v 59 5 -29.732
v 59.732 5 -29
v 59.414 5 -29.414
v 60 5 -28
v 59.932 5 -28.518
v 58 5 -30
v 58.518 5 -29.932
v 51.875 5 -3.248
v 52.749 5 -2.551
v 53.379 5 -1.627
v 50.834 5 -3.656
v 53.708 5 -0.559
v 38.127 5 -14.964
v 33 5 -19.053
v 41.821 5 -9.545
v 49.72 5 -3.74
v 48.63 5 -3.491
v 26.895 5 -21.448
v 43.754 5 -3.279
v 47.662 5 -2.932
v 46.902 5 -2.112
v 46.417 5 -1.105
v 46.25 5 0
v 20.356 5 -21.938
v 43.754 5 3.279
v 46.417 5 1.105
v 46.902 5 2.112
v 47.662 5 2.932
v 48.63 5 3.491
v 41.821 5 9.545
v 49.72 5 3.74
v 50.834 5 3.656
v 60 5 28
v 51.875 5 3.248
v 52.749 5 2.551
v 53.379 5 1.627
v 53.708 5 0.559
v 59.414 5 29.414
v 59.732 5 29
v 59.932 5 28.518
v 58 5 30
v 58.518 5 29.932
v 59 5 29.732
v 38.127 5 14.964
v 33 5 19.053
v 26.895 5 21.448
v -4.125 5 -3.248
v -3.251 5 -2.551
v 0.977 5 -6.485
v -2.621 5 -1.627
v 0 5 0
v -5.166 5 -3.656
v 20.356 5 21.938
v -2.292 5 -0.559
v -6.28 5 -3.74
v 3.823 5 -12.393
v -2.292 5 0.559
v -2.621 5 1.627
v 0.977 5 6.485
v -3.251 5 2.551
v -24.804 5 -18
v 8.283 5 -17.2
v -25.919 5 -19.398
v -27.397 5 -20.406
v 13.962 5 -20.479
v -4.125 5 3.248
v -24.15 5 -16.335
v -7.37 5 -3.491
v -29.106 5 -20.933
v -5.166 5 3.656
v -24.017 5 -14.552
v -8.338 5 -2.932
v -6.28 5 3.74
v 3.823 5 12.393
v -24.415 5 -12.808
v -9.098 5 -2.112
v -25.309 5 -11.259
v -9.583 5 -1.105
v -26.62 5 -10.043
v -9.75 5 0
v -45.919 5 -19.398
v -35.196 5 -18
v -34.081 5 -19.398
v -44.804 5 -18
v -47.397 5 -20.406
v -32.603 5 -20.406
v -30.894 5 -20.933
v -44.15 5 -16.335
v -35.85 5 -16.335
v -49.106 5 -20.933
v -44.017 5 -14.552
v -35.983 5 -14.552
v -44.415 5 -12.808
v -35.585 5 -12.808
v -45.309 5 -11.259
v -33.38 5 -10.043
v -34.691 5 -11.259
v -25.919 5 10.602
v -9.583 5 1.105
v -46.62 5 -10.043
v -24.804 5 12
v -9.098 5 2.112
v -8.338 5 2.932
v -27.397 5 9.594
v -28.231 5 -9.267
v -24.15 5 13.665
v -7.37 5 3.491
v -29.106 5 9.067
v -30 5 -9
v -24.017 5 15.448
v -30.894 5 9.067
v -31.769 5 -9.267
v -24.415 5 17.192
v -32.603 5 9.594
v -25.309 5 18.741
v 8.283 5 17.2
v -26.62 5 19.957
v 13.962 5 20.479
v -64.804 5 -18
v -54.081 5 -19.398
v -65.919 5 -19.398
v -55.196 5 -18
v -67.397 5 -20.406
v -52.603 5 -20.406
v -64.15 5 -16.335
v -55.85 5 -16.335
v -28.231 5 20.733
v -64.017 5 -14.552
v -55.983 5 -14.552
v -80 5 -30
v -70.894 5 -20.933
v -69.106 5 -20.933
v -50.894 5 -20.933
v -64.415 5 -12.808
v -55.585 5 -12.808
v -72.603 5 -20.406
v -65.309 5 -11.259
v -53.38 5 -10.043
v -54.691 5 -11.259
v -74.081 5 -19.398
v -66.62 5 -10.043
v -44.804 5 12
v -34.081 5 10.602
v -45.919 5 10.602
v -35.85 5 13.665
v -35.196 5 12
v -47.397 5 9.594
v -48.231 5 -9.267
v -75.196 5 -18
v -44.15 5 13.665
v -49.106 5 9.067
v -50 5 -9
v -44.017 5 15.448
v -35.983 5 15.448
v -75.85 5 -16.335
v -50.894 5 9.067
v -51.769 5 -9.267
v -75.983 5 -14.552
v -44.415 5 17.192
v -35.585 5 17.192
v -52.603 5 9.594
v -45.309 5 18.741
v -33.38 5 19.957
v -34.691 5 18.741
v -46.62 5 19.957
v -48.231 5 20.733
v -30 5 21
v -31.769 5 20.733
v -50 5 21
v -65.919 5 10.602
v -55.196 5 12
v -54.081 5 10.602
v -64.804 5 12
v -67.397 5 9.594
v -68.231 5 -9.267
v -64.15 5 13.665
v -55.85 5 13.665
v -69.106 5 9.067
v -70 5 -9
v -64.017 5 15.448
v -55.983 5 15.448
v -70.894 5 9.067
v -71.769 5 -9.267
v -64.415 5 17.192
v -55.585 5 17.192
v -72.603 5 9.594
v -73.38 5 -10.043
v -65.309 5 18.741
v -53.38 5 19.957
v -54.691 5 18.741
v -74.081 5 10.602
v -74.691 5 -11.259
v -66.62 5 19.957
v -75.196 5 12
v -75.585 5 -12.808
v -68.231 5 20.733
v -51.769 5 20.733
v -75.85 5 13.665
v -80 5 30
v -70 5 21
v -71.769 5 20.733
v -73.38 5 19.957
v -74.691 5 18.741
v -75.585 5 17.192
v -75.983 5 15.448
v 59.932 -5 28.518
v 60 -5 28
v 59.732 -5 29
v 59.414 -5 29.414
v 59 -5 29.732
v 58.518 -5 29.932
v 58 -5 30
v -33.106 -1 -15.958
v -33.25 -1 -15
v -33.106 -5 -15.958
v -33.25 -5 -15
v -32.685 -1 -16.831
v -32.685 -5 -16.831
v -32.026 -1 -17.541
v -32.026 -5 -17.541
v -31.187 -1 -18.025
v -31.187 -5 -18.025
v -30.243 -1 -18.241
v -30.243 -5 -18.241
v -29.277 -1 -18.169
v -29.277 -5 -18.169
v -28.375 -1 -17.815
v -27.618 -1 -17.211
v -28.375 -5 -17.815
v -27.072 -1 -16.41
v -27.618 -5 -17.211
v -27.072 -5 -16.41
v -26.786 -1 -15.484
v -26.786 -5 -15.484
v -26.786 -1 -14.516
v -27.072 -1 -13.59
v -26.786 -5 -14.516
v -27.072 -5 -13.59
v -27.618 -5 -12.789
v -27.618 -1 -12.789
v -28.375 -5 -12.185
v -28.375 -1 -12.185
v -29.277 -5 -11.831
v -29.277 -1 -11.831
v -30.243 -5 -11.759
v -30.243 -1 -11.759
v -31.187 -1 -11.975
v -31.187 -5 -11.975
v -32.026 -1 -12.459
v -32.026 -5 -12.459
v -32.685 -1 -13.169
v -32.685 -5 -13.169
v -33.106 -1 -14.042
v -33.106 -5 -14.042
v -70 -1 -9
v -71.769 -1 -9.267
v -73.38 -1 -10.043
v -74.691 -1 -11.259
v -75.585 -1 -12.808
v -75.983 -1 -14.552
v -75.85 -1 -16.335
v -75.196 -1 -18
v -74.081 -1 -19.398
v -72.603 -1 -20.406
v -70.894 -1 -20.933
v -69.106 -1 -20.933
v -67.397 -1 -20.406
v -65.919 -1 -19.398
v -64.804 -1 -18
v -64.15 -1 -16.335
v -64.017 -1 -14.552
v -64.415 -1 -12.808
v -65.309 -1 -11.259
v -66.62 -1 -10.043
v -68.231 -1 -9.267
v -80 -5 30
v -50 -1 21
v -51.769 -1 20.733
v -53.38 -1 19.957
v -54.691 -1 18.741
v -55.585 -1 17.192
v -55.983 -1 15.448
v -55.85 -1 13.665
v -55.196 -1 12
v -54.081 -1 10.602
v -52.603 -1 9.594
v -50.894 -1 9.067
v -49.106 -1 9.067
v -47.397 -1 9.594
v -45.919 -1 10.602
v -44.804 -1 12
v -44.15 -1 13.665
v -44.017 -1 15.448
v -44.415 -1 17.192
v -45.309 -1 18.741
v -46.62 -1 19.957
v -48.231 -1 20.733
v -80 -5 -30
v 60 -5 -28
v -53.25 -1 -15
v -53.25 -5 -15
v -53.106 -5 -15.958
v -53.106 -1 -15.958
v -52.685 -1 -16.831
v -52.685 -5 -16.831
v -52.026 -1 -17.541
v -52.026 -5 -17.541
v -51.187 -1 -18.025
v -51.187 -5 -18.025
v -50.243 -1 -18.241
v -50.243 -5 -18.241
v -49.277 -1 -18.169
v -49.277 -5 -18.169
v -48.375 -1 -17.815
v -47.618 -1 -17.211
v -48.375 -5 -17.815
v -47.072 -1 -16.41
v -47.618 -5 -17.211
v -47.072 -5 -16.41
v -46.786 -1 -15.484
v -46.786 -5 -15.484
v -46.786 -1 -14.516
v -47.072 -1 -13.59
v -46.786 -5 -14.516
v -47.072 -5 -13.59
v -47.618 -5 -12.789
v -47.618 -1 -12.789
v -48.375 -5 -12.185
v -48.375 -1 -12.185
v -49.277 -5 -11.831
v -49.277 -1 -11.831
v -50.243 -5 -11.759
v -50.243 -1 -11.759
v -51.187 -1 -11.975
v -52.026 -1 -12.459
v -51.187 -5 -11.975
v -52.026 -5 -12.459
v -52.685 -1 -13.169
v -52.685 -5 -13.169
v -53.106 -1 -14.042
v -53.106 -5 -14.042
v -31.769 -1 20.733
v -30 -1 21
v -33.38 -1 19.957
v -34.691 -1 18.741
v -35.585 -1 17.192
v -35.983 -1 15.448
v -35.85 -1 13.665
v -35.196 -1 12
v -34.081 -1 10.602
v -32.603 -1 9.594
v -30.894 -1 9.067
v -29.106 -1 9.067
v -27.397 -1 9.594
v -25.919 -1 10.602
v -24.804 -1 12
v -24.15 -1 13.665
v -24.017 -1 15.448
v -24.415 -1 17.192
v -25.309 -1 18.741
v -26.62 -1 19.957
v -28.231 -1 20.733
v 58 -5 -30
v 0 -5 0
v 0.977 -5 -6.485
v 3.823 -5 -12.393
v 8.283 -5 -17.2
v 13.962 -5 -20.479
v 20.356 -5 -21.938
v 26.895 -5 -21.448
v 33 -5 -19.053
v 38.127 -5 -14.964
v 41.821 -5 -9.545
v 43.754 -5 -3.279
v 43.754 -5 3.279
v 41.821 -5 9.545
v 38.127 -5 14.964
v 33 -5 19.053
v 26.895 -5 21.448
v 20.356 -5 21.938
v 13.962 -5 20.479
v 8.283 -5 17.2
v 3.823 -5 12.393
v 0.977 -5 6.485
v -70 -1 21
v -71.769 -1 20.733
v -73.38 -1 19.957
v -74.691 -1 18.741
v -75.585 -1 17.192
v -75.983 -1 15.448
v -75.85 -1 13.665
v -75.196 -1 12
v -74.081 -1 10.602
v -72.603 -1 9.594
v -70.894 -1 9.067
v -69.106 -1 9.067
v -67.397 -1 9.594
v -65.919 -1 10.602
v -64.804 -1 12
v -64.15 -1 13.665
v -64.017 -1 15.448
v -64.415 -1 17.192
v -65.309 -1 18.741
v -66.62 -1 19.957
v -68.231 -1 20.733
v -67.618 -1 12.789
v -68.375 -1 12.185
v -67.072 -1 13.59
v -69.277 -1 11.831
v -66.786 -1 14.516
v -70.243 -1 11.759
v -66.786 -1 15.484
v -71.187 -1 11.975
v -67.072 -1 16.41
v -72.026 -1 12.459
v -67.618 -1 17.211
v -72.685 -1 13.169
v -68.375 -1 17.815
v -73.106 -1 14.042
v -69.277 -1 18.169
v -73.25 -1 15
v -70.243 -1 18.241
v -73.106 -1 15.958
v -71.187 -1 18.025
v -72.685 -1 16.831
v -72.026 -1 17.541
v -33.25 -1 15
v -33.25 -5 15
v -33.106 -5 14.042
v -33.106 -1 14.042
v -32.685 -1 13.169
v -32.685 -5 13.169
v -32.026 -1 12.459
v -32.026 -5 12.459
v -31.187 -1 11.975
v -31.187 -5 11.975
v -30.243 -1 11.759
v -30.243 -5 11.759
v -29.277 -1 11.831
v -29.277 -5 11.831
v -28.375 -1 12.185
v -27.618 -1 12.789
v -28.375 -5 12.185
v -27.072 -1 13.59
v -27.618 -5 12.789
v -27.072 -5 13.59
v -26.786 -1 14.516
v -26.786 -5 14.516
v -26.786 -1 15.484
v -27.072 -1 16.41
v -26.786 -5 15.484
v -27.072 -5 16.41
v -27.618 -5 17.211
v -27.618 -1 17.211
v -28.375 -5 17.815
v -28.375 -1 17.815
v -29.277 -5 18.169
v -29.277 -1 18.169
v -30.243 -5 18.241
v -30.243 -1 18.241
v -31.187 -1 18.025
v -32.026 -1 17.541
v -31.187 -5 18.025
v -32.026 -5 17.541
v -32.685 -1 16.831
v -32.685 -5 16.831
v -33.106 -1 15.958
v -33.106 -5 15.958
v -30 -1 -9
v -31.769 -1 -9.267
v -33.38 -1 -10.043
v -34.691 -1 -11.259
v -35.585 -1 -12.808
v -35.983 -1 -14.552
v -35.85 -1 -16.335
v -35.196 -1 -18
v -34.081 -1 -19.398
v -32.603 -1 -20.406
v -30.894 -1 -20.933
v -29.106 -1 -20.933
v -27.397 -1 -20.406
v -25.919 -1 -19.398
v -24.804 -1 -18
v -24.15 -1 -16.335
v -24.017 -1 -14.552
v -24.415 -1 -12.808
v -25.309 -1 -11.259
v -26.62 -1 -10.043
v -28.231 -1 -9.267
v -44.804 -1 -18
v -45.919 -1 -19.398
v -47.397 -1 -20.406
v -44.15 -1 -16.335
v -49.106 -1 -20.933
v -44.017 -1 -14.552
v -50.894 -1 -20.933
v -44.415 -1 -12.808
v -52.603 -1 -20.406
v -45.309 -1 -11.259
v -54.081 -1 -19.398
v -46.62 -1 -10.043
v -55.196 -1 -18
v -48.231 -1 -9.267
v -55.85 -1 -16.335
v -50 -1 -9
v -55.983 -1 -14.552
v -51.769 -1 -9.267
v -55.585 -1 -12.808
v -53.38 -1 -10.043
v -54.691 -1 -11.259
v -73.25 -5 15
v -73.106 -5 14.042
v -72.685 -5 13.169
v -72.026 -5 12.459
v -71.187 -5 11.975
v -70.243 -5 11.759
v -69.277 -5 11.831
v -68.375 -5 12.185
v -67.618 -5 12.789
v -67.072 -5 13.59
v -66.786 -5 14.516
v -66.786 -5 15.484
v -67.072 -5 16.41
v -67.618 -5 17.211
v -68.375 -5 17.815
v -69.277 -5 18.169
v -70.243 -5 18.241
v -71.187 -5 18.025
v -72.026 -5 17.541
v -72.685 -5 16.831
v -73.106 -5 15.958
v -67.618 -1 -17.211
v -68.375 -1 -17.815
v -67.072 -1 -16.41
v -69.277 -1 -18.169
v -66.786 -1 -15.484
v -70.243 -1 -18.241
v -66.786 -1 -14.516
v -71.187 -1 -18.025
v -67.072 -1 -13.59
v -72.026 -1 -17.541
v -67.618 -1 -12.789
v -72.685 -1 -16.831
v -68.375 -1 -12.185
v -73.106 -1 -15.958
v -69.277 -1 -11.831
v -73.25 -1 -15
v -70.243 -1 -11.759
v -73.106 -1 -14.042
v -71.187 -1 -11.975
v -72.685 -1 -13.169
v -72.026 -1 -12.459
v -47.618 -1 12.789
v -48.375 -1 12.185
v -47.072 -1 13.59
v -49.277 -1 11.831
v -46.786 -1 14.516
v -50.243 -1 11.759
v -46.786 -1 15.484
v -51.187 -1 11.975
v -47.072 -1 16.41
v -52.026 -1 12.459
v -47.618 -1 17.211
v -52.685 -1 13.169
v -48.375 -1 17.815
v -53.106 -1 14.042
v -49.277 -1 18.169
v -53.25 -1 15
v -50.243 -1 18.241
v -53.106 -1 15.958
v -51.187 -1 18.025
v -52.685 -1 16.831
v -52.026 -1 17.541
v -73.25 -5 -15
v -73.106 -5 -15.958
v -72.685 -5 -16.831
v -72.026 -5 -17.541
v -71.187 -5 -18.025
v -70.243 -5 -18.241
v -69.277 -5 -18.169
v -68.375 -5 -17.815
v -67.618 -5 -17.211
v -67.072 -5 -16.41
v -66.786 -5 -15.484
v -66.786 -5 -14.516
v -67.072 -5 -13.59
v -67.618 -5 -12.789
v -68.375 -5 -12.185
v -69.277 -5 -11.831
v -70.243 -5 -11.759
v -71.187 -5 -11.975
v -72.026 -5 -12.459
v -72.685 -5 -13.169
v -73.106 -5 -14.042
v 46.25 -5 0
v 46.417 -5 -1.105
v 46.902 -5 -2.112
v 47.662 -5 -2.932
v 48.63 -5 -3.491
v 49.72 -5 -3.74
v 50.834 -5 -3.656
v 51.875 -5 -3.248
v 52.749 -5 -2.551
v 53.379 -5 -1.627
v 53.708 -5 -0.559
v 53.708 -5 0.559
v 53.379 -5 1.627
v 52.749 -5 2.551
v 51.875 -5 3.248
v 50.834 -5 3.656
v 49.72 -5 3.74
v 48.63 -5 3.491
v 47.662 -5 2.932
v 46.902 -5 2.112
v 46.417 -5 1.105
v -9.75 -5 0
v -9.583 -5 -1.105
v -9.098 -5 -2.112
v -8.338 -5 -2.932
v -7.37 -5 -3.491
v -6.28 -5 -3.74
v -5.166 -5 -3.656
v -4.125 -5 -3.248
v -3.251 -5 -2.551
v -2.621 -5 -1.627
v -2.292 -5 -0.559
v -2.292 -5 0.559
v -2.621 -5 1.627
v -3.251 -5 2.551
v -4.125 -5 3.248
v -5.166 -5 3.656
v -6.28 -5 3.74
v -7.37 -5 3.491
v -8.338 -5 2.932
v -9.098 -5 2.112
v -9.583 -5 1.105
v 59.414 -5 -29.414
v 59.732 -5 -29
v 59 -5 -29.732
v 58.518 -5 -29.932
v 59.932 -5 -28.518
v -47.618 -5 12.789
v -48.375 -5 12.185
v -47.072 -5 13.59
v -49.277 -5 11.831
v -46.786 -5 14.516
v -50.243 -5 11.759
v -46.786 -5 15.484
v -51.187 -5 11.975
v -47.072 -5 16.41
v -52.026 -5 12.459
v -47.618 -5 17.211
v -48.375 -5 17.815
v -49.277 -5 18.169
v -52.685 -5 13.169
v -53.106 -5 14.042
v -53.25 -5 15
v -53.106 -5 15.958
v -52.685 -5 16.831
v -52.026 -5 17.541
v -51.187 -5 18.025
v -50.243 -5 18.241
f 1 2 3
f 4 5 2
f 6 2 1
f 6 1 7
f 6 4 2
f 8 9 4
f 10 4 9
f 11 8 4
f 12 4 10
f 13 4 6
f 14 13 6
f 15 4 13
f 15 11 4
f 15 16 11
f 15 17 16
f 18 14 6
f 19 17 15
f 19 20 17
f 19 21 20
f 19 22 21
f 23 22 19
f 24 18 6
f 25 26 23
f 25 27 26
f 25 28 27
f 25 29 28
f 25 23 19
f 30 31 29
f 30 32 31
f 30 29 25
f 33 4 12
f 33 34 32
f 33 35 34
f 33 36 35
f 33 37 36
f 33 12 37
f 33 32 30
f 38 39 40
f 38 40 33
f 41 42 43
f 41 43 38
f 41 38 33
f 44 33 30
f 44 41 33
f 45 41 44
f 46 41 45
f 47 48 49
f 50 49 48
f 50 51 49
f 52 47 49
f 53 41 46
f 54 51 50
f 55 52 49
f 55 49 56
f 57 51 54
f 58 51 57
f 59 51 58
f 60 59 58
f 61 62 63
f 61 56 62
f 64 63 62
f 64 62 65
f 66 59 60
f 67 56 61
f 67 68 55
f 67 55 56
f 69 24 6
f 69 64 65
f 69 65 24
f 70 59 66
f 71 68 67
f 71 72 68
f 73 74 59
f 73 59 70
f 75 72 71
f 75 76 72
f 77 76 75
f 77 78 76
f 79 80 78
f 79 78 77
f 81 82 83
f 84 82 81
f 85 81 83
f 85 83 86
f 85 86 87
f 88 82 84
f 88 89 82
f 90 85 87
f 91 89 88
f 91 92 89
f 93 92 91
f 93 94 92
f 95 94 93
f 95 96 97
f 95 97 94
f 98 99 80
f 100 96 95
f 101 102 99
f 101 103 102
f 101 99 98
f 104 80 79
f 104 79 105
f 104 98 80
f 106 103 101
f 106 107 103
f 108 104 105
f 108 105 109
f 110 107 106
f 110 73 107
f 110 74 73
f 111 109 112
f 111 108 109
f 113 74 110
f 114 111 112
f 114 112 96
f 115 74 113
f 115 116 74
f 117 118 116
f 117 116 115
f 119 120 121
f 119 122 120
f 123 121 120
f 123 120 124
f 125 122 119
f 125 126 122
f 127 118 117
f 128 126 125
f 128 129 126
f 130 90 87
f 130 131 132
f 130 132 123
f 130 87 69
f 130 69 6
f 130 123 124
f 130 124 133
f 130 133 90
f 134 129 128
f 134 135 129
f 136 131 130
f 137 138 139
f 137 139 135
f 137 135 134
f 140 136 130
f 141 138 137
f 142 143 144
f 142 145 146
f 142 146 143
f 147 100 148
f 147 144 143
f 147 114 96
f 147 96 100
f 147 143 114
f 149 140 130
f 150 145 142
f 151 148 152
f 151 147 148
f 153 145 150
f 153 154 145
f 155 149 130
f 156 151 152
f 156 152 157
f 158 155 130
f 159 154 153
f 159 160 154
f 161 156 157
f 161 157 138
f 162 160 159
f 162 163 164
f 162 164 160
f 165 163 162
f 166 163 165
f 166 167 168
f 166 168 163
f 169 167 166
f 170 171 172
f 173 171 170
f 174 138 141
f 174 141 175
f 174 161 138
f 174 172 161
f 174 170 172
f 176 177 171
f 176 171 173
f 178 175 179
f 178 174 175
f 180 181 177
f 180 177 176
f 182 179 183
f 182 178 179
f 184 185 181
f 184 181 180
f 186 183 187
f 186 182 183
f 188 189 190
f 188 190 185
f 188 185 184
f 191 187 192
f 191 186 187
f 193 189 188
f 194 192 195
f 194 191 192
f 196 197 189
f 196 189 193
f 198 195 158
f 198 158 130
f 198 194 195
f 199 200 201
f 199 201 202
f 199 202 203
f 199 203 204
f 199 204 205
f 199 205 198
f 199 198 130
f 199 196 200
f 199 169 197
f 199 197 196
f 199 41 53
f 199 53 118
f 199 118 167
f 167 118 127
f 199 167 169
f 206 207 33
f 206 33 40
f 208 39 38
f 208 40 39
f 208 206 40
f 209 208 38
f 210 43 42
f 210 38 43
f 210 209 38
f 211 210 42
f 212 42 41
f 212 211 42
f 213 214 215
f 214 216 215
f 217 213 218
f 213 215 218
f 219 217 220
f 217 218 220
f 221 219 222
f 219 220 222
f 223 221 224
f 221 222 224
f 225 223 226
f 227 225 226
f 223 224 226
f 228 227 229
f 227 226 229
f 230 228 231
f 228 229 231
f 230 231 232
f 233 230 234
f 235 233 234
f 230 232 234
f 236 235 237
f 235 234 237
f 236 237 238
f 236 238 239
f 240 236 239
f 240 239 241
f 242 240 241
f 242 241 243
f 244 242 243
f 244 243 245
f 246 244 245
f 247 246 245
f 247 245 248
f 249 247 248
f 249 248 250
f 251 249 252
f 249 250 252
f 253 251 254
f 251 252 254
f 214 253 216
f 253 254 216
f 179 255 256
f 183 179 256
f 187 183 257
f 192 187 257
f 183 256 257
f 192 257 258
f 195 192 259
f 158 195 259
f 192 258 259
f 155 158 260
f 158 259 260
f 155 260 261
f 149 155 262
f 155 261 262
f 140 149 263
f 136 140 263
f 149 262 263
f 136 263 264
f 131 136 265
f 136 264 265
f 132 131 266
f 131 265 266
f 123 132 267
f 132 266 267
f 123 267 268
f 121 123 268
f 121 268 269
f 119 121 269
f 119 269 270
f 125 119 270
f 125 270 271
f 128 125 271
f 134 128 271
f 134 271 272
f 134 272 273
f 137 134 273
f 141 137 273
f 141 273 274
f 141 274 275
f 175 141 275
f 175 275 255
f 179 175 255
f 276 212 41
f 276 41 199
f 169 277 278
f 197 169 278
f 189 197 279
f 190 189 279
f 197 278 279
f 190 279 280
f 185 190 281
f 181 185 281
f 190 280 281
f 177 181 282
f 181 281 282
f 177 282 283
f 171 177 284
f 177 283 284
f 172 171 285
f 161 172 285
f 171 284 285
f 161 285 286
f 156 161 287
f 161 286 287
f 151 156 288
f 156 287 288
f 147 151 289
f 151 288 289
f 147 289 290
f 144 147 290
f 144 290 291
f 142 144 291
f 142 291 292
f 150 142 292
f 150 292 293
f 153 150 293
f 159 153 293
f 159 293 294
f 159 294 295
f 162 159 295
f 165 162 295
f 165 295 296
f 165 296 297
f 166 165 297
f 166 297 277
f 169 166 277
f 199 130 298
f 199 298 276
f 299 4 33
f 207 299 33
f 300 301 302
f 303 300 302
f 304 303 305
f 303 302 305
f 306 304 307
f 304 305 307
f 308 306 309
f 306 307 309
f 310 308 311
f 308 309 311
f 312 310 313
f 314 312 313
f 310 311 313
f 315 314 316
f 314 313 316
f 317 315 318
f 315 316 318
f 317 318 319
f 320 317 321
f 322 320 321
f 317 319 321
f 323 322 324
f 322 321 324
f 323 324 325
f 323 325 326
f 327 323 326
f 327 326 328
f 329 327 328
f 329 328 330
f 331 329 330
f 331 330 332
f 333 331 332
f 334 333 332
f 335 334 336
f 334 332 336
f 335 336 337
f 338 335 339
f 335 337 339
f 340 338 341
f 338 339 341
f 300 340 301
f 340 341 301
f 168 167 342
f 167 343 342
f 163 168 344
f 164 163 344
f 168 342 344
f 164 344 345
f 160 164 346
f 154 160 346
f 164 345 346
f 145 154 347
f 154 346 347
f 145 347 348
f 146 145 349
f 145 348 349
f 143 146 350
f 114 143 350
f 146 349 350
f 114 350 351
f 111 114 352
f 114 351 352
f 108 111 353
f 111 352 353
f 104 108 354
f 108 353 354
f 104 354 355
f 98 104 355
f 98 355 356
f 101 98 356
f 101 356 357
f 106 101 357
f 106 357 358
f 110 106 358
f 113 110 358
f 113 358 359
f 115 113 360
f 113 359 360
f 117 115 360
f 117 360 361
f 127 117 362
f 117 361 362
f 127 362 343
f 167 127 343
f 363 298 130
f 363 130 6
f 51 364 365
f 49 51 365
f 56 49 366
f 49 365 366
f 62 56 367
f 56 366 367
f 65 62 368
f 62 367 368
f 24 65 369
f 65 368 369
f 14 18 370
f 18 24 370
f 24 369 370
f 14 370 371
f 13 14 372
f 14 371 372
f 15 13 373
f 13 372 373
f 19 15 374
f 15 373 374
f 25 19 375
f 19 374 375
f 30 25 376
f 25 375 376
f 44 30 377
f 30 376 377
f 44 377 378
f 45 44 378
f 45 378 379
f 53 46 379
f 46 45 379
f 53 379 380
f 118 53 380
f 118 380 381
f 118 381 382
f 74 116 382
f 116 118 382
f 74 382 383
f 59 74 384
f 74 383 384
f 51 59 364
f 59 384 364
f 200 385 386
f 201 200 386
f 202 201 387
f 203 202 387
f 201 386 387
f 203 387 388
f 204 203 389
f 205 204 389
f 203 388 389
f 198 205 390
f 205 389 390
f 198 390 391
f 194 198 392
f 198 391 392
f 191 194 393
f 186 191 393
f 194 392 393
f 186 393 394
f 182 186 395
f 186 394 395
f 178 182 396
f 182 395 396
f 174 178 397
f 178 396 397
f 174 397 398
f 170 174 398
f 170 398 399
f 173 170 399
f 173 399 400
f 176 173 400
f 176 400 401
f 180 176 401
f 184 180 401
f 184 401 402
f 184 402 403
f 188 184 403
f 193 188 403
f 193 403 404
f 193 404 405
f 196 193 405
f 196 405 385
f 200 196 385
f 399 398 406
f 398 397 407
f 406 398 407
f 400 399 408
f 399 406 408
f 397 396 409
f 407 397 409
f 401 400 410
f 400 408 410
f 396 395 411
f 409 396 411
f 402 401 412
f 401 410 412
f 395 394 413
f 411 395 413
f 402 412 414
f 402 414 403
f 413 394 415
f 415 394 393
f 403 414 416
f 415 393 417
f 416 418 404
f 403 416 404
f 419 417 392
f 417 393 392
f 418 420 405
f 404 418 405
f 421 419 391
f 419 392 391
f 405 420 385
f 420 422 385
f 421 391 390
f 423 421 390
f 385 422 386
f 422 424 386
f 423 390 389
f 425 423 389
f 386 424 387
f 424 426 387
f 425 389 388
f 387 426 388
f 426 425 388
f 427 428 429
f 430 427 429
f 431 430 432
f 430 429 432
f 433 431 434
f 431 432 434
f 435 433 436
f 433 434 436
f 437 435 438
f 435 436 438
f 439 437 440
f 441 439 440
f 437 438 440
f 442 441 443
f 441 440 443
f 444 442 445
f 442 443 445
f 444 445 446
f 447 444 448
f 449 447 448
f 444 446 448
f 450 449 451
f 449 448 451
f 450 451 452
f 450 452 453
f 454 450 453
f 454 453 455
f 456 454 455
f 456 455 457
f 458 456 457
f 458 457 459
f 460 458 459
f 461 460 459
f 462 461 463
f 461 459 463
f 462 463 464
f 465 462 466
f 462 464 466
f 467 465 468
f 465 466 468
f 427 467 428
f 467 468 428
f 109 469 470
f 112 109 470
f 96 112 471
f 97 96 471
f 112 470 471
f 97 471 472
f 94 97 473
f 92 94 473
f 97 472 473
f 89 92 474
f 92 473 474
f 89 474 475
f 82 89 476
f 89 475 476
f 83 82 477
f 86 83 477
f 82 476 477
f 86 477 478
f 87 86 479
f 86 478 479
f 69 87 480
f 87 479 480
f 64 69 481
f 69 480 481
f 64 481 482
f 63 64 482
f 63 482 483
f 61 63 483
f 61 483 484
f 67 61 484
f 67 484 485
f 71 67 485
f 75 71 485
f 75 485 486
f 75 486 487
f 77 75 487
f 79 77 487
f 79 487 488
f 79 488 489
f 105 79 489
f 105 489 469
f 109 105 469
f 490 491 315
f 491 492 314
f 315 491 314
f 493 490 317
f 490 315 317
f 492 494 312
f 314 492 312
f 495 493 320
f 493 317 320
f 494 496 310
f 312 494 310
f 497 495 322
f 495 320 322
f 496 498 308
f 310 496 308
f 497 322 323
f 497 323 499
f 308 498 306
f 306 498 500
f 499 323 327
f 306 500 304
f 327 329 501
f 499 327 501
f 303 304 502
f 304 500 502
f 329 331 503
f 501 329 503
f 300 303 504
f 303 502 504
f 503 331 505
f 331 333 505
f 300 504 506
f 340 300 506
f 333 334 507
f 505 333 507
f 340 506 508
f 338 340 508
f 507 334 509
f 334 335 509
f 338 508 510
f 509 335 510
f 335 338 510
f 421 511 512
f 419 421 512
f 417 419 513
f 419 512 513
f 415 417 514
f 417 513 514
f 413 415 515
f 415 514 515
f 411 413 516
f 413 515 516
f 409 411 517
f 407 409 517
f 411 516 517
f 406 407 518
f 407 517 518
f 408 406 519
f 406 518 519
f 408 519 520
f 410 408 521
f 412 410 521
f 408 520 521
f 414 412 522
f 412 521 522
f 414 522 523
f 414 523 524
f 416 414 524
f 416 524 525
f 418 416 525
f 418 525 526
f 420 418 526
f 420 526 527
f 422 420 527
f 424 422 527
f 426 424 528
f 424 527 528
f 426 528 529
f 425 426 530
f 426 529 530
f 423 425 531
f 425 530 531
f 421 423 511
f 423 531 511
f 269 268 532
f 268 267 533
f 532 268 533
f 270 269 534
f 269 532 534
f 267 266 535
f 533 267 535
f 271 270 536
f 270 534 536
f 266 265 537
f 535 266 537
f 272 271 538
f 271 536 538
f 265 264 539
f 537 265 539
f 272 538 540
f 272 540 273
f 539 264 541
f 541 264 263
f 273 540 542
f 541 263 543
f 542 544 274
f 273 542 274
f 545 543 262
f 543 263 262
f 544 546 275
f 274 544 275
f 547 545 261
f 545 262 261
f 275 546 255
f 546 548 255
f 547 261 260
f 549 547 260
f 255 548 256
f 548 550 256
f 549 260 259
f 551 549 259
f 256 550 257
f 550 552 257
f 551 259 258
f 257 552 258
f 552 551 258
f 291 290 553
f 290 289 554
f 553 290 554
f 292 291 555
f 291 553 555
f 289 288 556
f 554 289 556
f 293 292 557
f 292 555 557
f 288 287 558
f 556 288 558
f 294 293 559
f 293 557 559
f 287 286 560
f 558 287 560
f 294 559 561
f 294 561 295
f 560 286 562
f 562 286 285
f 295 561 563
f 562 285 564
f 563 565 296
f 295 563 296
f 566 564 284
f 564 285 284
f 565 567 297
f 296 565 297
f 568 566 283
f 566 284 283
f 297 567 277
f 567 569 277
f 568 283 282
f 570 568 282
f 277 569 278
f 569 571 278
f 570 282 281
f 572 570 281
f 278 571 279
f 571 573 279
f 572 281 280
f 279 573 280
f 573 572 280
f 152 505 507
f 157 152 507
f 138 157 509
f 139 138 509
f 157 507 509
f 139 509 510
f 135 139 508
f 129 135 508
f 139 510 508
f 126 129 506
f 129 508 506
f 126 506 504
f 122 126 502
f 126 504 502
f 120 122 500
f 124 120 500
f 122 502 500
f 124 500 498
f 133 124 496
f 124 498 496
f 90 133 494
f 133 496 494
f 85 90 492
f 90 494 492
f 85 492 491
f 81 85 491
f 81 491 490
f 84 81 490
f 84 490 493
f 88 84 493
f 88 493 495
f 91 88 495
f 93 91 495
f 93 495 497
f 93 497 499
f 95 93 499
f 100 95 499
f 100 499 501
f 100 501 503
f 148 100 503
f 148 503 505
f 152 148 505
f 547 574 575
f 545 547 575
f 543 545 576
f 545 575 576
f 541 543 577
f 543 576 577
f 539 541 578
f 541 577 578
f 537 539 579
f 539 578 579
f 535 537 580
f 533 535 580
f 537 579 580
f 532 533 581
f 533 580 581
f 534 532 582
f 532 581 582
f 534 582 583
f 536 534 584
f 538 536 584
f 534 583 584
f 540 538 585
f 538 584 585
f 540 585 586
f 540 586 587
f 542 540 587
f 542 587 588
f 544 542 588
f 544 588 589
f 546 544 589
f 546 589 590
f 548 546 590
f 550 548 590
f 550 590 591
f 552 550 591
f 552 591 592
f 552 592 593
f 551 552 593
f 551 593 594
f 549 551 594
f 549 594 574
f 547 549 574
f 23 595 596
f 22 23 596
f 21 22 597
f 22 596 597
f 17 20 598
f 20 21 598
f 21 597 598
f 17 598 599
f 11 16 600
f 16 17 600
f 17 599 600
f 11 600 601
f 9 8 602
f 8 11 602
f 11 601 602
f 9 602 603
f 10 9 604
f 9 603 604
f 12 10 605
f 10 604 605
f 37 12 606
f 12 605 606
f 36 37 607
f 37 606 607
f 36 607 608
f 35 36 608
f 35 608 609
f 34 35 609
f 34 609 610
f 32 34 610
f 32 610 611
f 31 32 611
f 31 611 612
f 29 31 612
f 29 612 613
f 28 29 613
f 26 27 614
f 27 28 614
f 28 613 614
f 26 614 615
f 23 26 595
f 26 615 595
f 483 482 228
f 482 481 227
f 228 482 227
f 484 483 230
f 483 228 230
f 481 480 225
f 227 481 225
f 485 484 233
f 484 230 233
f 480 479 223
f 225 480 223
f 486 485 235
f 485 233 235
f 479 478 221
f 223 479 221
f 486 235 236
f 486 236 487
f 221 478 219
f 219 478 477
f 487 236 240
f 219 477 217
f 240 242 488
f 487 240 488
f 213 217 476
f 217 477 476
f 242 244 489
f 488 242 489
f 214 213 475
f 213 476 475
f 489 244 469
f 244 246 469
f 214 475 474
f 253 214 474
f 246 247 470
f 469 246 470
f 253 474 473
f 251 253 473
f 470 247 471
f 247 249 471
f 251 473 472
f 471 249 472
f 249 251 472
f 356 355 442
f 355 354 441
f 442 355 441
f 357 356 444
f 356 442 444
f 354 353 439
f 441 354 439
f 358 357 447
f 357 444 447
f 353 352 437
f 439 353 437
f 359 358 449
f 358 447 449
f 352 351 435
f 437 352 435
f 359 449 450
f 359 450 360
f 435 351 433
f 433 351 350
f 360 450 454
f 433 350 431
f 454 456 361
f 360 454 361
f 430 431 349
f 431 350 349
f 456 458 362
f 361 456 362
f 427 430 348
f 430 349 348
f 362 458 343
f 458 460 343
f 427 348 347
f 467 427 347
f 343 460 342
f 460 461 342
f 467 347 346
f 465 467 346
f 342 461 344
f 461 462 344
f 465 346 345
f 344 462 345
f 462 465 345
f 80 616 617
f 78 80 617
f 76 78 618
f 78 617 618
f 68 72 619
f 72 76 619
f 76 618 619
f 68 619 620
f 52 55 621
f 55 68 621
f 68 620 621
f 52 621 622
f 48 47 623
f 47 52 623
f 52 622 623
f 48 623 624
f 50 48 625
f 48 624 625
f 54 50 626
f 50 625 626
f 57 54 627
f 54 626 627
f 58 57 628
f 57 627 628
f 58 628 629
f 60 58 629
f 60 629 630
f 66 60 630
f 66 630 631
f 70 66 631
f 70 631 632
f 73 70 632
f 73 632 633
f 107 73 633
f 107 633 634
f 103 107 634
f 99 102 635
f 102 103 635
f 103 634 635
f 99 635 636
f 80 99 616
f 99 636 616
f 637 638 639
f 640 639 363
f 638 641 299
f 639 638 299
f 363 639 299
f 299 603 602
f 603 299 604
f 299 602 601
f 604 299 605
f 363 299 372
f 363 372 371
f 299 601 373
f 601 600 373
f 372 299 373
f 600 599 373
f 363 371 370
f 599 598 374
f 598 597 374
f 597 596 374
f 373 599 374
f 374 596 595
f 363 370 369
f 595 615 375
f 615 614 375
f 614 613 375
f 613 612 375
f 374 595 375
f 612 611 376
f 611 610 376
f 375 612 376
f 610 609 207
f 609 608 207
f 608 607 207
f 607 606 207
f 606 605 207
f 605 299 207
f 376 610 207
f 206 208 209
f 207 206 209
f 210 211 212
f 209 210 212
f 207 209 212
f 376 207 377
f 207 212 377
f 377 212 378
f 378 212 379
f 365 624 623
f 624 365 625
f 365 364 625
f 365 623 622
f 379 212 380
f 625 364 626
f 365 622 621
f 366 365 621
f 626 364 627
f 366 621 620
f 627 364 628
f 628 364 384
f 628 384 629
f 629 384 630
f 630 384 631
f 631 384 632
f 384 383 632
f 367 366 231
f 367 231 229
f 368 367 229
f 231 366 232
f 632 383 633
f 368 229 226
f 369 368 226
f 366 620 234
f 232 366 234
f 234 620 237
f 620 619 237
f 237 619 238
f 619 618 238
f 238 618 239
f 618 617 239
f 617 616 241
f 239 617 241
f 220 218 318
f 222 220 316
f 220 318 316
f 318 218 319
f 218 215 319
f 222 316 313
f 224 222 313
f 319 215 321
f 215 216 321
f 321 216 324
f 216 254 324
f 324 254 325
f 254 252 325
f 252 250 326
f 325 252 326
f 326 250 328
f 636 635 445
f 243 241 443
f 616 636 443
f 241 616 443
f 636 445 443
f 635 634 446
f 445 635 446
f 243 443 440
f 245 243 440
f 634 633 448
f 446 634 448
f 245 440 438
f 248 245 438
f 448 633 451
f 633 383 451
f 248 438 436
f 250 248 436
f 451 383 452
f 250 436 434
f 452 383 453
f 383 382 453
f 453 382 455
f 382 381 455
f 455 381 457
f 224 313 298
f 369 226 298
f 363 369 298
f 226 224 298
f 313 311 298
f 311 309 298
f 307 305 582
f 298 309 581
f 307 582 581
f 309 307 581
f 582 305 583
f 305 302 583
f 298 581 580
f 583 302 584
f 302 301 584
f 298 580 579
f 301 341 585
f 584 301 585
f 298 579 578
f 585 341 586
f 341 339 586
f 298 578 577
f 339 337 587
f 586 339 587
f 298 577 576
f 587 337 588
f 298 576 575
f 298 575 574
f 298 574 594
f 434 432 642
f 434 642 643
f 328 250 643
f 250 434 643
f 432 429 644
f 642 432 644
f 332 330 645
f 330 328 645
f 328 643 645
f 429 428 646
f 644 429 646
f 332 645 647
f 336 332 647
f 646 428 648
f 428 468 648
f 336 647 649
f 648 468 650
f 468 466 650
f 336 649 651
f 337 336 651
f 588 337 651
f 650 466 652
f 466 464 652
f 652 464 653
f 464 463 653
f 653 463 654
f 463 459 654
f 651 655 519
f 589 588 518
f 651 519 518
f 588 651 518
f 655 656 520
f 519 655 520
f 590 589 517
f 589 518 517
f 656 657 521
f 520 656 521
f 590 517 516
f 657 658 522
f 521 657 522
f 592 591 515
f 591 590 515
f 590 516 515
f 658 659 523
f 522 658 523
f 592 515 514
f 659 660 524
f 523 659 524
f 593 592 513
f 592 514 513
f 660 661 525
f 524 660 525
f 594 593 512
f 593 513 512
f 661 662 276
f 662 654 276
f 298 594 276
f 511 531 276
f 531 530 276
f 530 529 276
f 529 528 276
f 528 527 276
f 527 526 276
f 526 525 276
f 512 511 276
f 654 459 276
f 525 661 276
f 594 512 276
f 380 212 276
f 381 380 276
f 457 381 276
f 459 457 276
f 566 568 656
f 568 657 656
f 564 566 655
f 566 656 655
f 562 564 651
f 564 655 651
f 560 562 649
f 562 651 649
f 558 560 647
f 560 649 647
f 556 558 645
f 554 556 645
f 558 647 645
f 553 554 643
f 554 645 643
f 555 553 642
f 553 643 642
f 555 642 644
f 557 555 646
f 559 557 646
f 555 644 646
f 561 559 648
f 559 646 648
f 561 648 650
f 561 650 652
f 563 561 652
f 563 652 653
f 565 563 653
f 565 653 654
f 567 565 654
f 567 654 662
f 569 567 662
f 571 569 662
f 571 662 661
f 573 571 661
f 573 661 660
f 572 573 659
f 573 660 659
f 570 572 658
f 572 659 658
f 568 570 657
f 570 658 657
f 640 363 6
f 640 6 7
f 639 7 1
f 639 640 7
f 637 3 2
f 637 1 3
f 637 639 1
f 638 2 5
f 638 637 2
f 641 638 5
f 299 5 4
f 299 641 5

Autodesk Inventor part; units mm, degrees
ref_plane "YZ Plane" through (0, 0, 0) normal (1, 0, 0) x (0, 1, 0)
ref_plane "XZ Plane" through (0, 0, 0) normal (0, 1, 0) x (-1, 0, 0)
ref_plane "XY Plane" through (0, 0, 0) normal (0, 0, 1) x (1, 0, 0)
sketch "Sketch1" plane through (0, 0, 0) normal (0, 1, 0) x (-1, 0, 0)
  line L0 (-98, 30) -> (98, 30)
  line L1 (100, 28) -> (100, -28)
  line L2 (98, -30) -> (-98, -30)
  line L3 (-100, -28) -> (-100, 28)
  line L4 (-100, 30) -> (100, -30) construction
  line L5 (100, 30) -> (-100, -30) construction
  arc A0 (-98, 30) -> (-100, 28) centre (-98, 28) ccw
  arc A1 (100, 28) -> (98, 30) centre (98, 28) ccw
  arc A2 (98, -30) -> (100, -28) centre (98, -28) ccw
  arc A3 (-100, -28) -> (-98, -30) centre (-98, -28) ccw
  circle A4 centre (-22, 0) radius 22
  circle A5 centre (-50, 0) radius 3.75
  circle A6 centre (6, 0) radius 3.75
  circle A7 centre (30, 15) radius 3.25
  circle A8 centre (50, 15) radius 3.25
  circle A9 centre (70, 15) radius 3.25
  circle A10 centre (30, -15) radius 3.25
  circle A11 centre (50, -15) radius 3.25
  circle A12 centre (70, -15) radius 3.25
  point P0 (0, 0)
  point P1 (-100, 0)
  dimension "d0" = 60
  dimension "d1" = 200
  dimension "d2" = 2
  dimension "d3" = 44
  dimension "d4" = 56
  dimension "d5" = 28
  dimension "d6" = 7.5
  dimension "d7" = 7.5
  dimension "d8" = 50
  dimension "d9" = 6.5
  dimension "d10" = 6.5
  dimension "d11" = 6.5
  dimension "d12" = 6.5
  dimension "d13" = 6.5
  dimension "d14" = 6.5
  dimension "d15" = 15
  dimension "d16" = 30
  dimension "d17" = 30
  dimension "d18" = 20
  dimension "d19" = 20
extrude "Plate1" add sketch "Sketch1" along normal mid plane 10
sketch "Sketch2" plane through (0, 5, 0) normal (0, 1, 0) x (1, 0, 0)
  line L0 (98, -30) -> (-98, -30) projected
  line L1 (100, 30) -> (60, 30)
  line L2 (60, 30) -> (60, -30)
  line L3 (60, -30) -> (100, -30)
  line L4 (100, -30) -> (100, 30)
  line L5 (100, 28) -> (100, -28) projected
  line L6 (-98, 30) -> (98, 30) projected
  point P0 (0, 0)
  dimension "d21" = 40
extrude "Cut1" cut sketch "Sketch2" against normal blind 10
fillet "Corner Round1" radius 2 2 edges at (60, 0, -30) (60, 0, 30)
sketch "Sketch3" plane through (0, 5, 0) normal (0, 1, 0) x (1, 0, 0)
  line L0 (-98, 30) -> (58, 30) construction
  line L1 (-100, -28) -> (-100, 28) construction
  line L2 (-100, 30) -> (-80, 30)
  line L3 (-80, 30) -> (-80, -30)
  line L4 (-80, -30) -> (-100, -30)
  line L5 (-100, -30) -> (-100, 30)
  circle A0 centre (-70, -15) radius 3.25 projected
  point P0 (0, 0)
  point P1 (-98, -30)
  dimension "d26" = 20
extrude "Cut2" cut sketch "Sketch3" against normal blind 10 contours L2 L3 L4 L5
sketch "Sketch4" plane through (0, 5, 0) normal (0, 1, 0) x (1, 0, 0)
  circle A0 centre (-70, 15) radius 3.25 projected
  circle A1 centre (-50, 15) radius 3.25 projected
  circle A2 centre (-30, 15) radius 3.25 projected
  circle A3 centre (-30, -15) radius 3.25 projected
  circle A4 centre (-50, -15) radius 3.25 projected
  circle A5 centre (-70, -15) radius 3.25 projected
  point P0 (0, 0)
hole "Hole1" at (-70, 5, -15) at (-50, 5, -15) at (-30, 5, -15) at (-30, 5, 15) at (-50, 5, 15) at (-70, 5, 15) direction (0, -1, 0) diameter 12 depth 6
equation "\"d7\" = d6"
equation "\"d10\" = d9"
equation "\"d11\" = d9"
equation "\"d12\" = d9"
equation "\"d13\" = d9"
equation "\"d14\" = d9"
equation "\"d22\" = Thickness"
equation "\"d27\" = Thickness"
equation "\"d20\" = Thickness"
equation "\"BendReliefDepth\" = 0.5 * Thickness"
equation "\"Thickness\" = 10"
properties part number "HCMUTE-CDT23-BAT_TRUC_DAN" material "Stainless Steel"
